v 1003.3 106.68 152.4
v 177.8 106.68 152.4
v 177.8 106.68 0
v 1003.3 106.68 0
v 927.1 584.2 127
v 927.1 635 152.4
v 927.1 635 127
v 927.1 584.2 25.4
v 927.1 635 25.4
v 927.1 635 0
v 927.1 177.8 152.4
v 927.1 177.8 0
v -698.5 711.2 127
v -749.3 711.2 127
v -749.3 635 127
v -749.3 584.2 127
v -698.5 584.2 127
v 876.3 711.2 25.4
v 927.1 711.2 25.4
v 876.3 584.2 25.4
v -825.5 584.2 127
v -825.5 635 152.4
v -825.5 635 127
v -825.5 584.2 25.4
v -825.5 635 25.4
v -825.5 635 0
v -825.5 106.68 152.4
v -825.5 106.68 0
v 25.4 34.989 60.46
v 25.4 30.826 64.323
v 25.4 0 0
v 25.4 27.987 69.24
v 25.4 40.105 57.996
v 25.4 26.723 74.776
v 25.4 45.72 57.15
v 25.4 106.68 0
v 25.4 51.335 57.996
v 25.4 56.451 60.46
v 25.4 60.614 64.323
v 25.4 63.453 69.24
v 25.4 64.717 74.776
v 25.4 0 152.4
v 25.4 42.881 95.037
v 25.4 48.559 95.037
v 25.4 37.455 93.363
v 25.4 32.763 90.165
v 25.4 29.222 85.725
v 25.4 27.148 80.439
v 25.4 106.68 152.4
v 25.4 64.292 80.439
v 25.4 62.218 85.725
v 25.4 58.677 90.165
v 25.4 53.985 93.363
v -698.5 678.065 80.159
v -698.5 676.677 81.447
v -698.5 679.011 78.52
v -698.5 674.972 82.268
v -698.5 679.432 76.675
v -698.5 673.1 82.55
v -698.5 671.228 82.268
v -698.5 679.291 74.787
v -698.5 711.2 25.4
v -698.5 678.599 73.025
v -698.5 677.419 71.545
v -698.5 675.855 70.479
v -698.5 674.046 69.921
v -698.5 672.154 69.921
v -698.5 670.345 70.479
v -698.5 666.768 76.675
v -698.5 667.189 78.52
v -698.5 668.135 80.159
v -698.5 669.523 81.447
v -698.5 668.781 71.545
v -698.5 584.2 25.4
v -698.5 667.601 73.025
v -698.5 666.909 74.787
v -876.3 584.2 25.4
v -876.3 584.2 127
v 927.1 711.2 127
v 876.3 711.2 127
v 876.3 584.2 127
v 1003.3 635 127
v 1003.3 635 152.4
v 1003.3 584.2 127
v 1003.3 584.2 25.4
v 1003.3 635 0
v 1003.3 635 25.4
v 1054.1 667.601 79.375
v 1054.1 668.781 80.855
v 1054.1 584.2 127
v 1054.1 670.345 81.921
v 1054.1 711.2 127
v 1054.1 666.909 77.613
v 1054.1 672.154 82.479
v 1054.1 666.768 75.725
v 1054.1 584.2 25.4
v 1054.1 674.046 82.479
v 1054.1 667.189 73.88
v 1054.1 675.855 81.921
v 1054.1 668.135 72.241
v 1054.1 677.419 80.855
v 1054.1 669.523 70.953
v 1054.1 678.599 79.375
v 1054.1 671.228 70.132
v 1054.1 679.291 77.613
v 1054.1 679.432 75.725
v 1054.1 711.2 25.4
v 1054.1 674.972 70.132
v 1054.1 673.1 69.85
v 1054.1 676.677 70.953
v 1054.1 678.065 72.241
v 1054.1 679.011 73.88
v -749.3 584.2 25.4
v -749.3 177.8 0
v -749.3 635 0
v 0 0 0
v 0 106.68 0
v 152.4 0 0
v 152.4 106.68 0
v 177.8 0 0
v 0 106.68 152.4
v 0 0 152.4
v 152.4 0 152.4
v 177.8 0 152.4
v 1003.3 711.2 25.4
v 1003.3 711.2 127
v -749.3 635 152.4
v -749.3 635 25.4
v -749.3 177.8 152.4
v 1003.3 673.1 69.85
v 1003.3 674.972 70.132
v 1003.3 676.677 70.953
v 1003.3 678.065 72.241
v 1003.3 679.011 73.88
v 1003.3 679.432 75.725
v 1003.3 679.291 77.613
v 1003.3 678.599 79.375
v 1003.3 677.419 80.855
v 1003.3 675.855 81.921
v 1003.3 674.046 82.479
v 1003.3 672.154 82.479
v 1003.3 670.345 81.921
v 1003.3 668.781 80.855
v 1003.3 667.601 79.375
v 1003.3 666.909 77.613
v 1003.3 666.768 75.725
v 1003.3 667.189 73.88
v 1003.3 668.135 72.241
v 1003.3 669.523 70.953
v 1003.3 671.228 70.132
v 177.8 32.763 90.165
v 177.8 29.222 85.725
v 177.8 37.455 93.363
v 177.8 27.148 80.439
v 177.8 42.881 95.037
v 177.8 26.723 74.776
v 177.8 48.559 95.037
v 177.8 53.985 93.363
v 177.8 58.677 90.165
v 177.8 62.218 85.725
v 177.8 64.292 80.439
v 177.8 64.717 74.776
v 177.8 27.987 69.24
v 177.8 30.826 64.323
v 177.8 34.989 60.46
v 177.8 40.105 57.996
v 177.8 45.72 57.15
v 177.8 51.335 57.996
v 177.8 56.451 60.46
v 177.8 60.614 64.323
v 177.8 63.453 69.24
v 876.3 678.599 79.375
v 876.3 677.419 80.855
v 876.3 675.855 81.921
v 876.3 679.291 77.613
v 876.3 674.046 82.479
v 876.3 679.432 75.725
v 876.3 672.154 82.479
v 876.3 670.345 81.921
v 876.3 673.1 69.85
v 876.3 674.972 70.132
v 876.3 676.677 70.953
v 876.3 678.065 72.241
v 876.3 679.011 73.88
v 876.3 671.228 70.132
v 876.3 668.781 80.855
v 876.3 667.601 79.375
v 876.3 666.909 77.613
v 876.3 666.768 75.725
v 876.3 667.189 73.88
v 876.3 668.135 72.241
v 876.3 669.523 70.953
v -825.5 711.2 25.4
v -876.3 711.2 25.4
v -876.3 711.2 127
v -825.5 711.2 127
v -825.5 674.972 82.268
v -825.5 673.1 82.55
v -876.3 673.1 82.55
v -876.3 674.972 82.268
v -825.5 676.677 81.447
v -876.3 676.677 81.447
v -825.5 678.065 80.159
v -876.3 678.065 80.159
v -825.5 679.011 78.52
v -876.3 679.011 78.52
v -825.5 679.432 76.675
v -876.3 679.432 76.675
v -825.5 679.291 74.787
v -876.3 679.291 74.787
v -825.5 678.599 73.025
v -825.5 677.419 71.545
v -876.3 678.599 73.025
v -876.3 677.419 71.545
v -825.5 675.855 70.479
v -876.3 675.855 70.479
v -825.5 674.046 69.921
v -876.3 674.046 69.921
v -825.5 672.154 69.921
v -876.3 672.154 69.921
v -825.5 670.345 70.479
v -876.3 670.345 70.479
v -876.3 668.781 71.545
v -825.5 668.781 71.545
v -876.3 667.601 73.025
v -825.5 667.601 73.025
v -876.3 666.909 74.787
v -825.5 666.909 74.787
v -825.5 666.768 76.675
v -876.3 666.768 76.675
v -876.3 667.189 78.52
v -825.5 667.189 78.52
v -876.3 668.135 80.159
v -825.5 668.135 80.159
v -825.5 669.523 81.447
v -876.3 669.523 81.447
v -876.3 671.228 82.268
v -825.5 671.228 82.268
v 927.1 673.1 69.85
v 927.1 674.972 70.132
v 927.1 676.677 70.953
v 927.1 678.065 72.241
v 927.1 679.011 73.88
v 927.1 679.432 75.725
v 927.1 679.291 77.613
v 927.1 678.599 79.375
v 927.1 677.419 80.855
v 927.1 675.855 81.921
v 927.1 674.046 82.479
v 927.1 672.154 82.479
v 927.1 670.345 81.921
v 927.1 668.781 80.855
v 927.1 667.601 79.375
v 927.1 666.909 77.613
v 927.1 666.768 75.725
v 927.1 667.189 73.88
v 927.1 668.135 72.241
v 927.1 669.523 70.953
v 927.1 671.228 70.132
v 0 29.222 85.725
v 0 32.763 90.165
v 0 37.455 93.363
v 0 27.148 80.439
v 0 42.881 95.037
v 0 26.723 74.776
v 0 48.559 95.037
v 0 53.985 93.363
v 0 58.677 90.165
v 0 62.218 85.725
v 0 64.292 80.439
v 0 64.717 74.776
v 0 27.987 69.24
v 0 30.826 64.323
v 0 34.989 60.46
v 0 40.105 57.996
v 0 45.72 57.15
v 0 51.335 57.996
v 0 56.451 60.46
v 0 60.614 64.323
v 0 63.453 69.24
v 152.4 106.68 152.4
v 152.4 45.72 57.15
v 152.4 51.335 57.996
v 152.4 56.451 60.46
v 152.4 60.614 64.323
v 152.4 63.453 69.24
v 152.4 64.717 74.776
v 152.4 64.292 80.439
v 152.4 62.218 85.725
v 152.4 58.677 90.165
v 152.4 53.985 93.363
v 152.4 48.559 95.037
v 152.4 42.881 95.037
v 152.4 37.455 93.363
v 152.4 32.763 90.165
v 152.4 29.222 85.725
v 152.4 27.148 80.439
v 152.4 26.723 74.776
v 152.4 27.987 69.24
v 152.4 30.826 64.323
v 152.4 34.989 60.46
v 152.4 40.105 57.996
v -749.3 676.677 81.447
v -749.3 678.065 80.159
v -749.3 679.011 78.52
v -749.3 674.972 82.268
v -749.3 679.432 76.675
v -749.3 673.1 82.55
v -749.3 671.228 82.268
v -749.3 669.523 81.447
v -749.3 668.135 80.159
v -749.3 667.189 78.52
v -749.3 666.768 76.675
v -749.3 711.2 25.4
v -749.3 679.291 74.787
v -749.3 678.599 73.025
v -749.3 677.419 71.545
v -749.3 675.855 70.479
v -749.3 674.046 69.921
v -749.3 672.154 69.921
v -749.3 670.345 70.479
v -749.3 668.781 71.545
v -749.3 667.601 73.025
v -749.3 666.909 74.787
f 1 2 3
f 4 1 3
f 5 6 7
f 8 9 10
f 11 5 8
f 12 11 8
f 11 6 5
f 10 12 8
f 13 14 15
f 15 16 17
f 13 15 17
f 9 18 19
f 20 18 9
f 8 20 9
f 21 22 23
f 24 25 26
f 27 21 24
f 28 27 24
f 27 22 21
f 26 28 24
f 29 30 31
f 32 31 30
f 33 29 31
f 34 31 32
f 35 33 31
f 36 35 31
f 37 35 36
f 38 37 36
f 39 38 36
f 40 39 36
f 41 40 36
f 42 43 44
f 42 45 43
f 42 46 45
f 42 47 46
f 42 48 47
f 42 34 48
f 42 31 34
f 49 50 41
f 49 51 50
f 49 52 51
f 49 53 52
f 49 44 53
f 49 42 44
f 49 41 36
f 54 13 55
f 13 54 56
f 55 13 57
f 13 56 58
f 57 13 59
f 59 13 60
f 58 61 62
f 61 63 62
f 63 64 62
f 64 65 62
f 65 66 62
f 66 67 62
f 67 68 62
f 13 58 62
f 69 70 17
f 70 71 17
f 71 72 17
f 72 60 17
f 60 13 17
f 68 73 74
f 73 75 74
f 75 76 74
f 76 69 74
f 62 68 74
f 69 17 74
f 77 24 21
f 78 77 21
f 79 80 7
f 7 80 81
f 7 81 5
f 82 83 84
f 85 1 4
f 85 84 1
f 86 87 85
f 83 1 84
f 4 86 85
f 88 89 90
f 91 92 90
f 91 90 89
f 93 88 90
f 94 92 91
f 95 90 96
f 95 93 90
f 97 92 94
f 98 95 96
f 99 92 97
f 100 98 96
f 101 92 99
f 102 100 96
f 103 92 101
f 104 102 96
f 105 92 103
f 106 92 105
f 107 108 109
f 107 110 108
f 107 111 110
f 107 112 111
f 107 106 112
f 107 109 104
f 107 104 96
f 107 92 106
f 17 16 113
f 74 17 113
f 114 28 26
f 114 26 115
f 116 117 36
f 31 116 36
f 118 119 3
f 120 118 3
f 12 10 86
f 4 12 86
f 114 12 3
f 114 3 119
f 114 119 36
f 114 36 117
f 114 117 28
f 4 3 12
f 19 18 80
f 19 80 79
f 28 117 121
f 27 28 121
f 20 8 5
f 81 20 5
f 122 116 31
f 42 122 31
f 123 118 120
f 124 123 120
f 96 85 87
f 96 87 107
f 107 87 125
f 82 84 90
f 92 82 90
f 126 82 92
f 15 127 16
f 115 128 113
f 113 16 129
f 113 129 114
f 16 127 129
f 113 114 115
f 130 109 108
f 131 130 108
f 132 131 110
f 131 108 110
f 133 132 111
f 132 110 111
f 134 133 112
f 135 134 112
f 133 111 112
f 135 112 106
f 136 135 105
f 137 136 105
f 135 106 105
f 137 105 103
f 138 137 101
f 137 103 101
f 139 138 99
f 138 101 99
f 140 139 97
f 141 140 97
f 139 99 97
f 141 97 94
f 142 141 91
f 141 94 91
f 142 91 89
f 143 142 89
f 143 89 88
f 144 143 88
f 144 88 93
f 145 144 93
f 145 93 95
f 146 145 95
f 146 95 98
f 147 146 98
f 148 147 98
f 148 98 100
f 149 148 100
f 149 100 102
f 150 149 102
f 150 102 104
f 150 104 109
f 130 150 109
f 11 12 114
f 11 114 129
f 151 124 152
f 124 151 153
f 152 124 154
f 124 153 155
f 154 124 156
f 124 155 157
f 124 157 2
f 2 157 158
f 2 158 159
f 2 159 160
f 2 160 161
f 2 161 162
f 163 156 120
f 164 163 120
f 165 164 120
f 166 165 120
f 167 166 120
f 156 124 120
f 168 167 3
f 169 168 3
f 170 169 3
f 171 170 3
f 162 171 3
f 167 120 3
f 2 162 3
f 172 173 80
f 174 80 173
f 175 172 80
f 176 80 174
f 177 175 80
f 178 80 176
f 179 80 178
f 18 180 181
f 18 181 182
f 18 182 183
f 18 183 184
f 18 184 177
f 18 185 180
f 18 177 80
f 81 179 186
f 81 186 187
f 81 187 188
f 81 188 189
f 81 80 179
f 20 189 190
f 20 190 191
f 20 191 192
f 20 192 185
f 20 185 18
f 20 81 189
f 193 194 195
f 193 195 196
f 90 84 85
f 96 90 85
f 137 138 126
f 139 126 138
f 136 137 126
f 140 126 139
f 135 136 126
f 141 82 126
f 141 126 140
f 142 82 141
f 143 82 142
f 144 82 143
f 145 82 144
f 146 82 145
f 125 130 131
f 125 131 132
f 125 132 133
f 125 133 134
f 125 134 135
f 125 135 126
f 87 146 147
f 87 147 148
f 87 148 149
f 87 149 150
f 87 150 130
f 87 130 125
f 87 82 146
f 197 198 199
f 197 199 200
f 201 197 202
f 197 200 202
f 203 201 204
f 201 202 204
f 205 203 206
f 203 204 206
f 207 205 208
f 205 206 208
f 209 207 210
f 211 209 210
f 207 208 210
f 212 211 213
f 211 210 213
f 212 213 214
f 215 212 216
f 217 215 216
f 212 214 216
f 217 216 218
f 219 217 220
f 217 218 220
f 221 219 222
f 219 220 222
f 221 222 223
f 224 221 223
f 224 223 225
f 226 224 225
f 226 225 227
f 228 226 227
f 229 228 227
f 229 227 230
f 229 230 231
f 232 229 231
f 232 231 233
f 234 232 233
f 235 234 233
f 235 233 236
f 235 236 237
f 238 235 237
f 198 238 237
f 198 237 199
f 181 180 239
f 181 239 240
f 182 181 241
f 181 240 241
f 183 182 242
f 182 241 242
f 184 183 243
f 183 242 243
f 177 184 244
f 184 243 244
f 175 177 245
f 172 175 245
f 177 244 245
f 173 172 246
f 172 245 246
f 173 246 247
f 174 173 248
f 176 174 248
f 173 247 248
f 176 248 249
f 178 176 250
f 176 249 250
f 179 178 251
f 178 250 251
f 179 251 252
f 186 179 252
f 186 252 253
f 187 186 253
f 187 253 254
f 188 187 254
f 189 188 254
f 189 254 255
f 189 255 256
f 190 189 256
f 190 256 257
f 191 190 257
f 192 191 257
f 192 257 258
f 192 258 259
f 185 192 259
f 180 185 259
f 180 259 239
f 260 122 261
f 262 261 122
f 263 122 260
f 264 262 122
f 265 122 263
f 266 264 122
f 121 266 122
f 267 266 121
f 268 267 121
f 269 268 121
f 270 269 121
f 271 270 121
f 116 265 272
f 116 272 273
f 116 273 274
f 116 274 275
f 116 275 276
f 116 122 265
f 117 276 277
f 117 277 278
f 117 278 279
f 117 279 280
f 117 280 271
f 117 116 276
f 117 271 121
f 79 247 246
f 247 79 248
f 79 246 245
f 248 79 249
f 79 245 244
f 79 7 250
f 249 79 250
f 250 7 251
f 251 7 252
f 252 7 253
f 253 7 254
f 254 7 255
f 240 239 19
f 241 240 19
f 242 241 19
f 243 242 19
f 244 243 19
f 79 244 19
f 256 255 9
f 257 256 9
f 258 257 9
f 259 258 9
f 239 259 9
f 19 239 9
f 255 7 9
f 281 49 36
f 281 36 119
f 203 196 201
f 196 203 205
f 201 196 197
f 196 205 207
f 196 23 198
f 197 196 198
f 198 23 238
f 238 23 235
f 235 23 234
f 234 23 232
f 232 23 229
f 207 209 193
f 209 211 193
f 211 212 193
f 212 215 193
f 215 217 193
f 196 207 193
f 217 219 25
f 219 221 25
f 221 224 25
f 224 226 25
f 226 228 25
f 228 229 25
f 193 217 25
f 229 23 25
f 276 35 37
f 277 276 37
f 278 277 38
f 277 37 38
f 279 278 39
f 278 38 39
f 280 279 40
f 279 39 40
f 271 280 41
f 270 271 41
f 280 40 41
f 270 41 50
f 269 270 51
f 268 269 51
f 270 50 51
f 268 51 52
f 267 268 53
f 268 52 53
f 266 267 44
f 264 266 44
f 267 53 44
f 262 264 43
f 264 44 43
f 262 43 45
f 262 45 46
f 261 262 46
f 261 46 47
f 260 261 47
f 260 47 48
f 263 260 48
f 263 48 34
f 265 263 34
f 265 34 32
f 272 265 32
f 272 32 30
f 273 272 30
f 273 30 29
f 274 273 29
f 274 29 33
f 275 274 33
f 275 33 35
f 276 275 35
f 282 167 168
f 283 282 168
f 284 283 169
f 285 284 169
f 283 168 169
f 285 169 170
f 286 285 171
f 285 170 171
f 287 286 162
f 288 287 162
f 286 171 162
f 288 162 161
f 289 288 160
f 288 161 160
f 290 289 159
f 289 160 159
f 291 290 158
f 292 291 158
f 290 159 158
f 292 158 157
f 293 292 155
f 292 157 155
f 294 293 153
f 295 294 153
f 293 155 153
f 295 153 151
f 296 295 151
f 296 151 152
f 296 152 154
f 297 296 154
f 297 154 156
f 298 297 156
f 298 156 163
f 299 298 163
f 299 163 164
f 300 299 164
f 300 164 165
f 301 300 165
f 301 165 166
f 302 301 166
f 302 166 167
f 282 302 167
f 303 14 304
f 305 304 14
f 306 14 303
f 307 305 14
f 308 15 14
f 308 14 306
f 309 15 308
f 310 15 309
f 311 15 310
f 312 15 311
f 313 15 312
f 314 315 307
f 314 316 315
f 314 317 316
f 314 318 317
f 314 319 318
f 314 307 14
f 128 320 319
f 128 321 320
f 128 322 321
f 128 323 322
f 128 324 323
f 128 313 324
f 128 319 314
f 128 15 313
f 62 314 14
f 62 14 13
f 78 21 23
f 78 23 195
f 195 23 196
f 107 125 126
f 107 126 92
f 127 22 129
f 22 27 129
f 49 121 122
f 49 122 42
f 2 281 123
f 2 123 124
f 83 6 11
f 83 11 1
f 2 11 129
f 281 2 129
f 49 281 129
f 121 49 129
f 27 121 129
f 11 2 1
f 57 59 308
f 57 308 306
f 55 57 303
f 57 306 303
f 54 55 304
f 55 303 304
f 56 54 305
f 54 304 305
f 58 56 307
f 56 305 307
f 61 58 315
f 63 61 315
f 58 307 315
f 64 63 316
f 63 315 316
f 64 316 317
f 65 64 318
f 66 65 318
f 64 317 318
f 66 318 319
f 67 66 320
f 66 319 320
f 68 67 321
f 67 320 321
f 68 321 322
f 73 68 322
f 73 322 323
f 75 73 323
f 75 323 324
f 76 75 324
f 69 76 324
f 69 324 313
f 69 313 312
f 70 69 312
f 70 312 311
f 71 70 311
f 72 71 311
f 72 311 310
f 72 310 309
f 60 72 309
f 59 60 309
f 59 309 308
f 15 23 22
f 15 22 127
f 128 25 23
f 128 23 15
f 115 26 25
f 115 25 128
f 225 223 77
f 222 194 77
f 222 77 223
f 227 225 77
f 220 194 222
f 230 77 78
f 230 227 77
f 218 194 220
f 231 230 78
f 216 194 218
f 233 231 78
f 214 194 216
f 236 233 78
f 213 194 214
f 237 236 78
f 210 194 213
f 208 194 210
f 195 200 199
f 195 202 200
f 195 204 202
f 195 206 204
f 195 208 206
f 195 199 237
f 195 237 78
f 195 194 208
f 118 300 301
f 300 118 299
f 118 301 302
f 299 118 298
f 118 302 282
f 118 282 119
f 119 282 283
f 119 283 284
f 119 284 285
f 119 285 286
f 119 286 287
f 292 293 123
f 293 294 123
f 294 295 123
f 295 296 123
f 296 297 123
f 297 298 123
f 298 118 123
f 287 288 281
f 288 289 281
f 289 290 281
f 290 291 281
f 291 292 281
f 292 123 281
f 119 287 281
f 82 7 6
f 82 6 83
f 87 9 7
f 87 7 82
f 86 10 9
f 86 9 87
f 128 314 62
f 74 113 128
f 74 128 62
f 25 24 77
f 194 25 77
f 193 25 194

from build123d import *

# Parameters (mm, degrees)
SKETCH1_W            = 177.8
SKETCH1_H            = 177.8
BOSS_EXTRUDE1_DEPTH  = 152.4
SKETCH2_W            = 127
SKETCH2_H            = 106.68
CUT_EXTRUDE1_DEPTH   = 152.4
SKETCH3_R            = 19.05
CUT_EXTRUDE2_DEPTH   = 182.626
SKETCH4_W            = 152.4
SKETCH4_H            = 71.12
BOSS_EXTRUDE2_DEPTH  = 825.5
SKETCH5_W            = 152.4
SKETCH5_H            = 71.12
BOSS_EXTRUDE3_DEPTH  = 825.5
SKETCH6_W            = 76.2
SKETCH6_H            = 152.4
BOSS_EXTRUDE4_DEPTH  = 457.2
SKETCH7_W            = 101.6
SKETCH7_H            = 50.8
BOSS_EXTRUDE9_DEPTH  = 50.8
SKETCH12_W           = 101.6
SKETCH12_H           = 50.8
BOSS_EXTRUDE10_DEPTH = 50.8
SKETCH13_W           = 101.6
SKETCH13_H           = 50.8
BOSS_EXTRUDE11_DEPTH = 50.8
SKETCH14_W           = 101.6
SKETCH14_H           = 50.8
BOSS_EXTRUDE12_DEPTH = 50.8
SKETCH15_W           = 50.8
SKETCH15_H           = 101.6
BOSS_EXTRUDE13_DEPTH = 76.2
SKETCH16_W           = 50.8
SKETCH16_H           = 101.6
BOSS_EXTRUDE14_DEPTH = 76.2
SKETCH17_R           = 6.35
CUT_EXTRUDE3_DEPTH   = 205.994
SKETCH18_R           = 6.35
CUT_EXTRUDE4_DEPTH   = 205.994


with BuildPart() as part:
    # Sketch1 → Boss-Extrude1 (new body)
    with BuildSketch(Plane.XY):
        with Locations((88.9, 88.9)):
            Rectangle(SKETCH1_W, SKETCH1_H)
    extrude(amount=BOSS_EXTRUDE1_DEPTH)

    # Sketch2 → Cut-Extrude1 (cut)
    with BuildSketch(Plane.XY.offset(152.4)):
        with Locations((88.9, 53.34)):
            Rectangle(SKETCH2_W, SKETCH2_H)
    extrude(amount=-CUT_EXTRUDE1_DEPTH, mode=Mode.SUBTRACT)

    # Sketch3 → Cut-Extrude2 (cut)
    with BuildSketch(Plane(origin=(177.8, 0, 0), x_dir=(0, 0, -1), z_dir=(1, 0, 0))):
        with Locations((-76.2, 45.72)):
            Circle(SKETCH3_R)
    extrude(amount=-CUT_EXTRUDE2_DEPTH, mode=Mode.SUBTRACT)

    # Sketch4 → Boss-Extrude2 (add)
    with BuildSketch(Plane(origin=(177.8, 0, 0), x_dir=(0, 0, -1), z_dir=(1, 0, 0))):
        with Locations((-76.2, 142.24)):
            Rectangle(SKETCH4_W, SKETCH4_H)
    extrude(amount=BOSS_EXTRUDE2_DEPTH)

    # Sketch5 → Boss-Extrude3 (add)
    with BuildSketch(Plane.ZY):
        with Locations((76.2, 142.24)):
            Rectangle(SKETCH5_W, SKETCH5_H)
    extrude(amount=BOSS_EXTRUDE3_DEPTH)

    # Sketch6 → Boss-Extrude4 (add)
    with BuildSketch(Plane(origin=(0, 177.8, 0), x_dir=(1, 0, 0), z_dir=(0, 1, 0))):
        with Locations((-787.4, -76.2)):
            Rectangle(SKETCH6_W, SKETCH6_H)
        with Locations((965.2, -76.2)):
            Rectangle(SKETCH6_W, SKETCH6_H)
    extrude(amount=BOSS_EXTRUDE4_DEPTH)

    # Sketch7 → Boss-Extrude9 (add)
    with BuildSketch(Plane.ZY.offset(825.5)):
        with Locations((76.2, 609.6)):
            Rectangle(SKETCH7_W, SKETCH7_H)
    extrude(amount=BOSS_EXTRUDE9_DEPTH)

    # Sketch12 → Boss-Extrude10 (add)
    with BuildSketch(Plane(origin=(-749.3, 0, 0), x_dir=(0, 0, -1), z_dir=(1, 0, 0))):
        with Locations((-76.2, 609.6)):
            Rectangle(SKETCH12_W, SKETCH12_H)
    extrude(amount=BOSS_EXTRUDE10_DEPTH)

    # Sketch13 → Boss-Extrude11 (add)
    with BuildSketch(Plane.ZY.offset(-927.1)):
        with Locations((76.2, 609.6)):
            Rectangle(SKETCH13_W, SKETCH13_H)
    extrude(amount=BOSS_EXTRUDE11_DEPTH)

    # Sketch14 → Boss-Extrude12 (add)
    with BuildSketch(Plane(origin=(1003.3, 0, 0), x_dir=(0, 0, -1), z_dir=(1, 0, 0))):
        with Locations((-76.2, 609.6)):
            Rectangle(SKETCH14_W, SKETCH14_H)
    extrude(amount=BOSS_EXTRUDE12_DEPTH)

    # Sketch15 → Boss-Extrude13 (add)
    with BuildSketch(Plane(origin=(0, 635, 0), x_dir=(1, 0, 0), z_dir=(0, 1, 0))):
        with Locations((901.7, -76.2)):
            Rectangle(SKETCH15_W, SKETCH15_H)
        with Locations((1028.7, -76.2)):
            Rectangle(SKETCH15_W, SKETCH15_H)
    extrude(amount=BOSS_EXTRUDE13_DEPTH)

    # Sketch16 → Boss-Extrude14 (add)
    with BuildSketch(Plane(origin=(0, 635, 0), x_dir=(1, 0, 0), z_dir=(0, 1, 0))):
        with Locations((-723.9, -76.2)):
            Rectangle(SKETCH16_W, SKETCH16_H)
        with Locations((-850.9, -76.2)):
            Rectangle(SKETCH16_W, SKETCH16_H)
    extrude(amount=BOSS_EXTRUDE14_DEPTH)

    # Sketch17 → Cut-Extrude3 (cut)
    with BuildSketch(Plane.ZY.offset(876.3)):
        with Locations((76.2, 673.1)):
            Circle(SKETCH17_R)
    extrude(amount=-CUT_EXTRUDE3_DEPTH, mode=Mode.SUBTRACT)

    # Sketch18 → Cut-Extrude4 (cut)
    with BuildSketch(Plane(origin=(1054.1, 0, 0), x_dir=(0, 0, -1), z_dir=(1, 0, 0))):
        with Locations((-76.2, 673.1)):
            Circle(SKETCH18_R)
    extrude(amount=-CUT_EXTRUDE4_DEPTH, mode=Mode.SUBTRACT)


solid = part.part
